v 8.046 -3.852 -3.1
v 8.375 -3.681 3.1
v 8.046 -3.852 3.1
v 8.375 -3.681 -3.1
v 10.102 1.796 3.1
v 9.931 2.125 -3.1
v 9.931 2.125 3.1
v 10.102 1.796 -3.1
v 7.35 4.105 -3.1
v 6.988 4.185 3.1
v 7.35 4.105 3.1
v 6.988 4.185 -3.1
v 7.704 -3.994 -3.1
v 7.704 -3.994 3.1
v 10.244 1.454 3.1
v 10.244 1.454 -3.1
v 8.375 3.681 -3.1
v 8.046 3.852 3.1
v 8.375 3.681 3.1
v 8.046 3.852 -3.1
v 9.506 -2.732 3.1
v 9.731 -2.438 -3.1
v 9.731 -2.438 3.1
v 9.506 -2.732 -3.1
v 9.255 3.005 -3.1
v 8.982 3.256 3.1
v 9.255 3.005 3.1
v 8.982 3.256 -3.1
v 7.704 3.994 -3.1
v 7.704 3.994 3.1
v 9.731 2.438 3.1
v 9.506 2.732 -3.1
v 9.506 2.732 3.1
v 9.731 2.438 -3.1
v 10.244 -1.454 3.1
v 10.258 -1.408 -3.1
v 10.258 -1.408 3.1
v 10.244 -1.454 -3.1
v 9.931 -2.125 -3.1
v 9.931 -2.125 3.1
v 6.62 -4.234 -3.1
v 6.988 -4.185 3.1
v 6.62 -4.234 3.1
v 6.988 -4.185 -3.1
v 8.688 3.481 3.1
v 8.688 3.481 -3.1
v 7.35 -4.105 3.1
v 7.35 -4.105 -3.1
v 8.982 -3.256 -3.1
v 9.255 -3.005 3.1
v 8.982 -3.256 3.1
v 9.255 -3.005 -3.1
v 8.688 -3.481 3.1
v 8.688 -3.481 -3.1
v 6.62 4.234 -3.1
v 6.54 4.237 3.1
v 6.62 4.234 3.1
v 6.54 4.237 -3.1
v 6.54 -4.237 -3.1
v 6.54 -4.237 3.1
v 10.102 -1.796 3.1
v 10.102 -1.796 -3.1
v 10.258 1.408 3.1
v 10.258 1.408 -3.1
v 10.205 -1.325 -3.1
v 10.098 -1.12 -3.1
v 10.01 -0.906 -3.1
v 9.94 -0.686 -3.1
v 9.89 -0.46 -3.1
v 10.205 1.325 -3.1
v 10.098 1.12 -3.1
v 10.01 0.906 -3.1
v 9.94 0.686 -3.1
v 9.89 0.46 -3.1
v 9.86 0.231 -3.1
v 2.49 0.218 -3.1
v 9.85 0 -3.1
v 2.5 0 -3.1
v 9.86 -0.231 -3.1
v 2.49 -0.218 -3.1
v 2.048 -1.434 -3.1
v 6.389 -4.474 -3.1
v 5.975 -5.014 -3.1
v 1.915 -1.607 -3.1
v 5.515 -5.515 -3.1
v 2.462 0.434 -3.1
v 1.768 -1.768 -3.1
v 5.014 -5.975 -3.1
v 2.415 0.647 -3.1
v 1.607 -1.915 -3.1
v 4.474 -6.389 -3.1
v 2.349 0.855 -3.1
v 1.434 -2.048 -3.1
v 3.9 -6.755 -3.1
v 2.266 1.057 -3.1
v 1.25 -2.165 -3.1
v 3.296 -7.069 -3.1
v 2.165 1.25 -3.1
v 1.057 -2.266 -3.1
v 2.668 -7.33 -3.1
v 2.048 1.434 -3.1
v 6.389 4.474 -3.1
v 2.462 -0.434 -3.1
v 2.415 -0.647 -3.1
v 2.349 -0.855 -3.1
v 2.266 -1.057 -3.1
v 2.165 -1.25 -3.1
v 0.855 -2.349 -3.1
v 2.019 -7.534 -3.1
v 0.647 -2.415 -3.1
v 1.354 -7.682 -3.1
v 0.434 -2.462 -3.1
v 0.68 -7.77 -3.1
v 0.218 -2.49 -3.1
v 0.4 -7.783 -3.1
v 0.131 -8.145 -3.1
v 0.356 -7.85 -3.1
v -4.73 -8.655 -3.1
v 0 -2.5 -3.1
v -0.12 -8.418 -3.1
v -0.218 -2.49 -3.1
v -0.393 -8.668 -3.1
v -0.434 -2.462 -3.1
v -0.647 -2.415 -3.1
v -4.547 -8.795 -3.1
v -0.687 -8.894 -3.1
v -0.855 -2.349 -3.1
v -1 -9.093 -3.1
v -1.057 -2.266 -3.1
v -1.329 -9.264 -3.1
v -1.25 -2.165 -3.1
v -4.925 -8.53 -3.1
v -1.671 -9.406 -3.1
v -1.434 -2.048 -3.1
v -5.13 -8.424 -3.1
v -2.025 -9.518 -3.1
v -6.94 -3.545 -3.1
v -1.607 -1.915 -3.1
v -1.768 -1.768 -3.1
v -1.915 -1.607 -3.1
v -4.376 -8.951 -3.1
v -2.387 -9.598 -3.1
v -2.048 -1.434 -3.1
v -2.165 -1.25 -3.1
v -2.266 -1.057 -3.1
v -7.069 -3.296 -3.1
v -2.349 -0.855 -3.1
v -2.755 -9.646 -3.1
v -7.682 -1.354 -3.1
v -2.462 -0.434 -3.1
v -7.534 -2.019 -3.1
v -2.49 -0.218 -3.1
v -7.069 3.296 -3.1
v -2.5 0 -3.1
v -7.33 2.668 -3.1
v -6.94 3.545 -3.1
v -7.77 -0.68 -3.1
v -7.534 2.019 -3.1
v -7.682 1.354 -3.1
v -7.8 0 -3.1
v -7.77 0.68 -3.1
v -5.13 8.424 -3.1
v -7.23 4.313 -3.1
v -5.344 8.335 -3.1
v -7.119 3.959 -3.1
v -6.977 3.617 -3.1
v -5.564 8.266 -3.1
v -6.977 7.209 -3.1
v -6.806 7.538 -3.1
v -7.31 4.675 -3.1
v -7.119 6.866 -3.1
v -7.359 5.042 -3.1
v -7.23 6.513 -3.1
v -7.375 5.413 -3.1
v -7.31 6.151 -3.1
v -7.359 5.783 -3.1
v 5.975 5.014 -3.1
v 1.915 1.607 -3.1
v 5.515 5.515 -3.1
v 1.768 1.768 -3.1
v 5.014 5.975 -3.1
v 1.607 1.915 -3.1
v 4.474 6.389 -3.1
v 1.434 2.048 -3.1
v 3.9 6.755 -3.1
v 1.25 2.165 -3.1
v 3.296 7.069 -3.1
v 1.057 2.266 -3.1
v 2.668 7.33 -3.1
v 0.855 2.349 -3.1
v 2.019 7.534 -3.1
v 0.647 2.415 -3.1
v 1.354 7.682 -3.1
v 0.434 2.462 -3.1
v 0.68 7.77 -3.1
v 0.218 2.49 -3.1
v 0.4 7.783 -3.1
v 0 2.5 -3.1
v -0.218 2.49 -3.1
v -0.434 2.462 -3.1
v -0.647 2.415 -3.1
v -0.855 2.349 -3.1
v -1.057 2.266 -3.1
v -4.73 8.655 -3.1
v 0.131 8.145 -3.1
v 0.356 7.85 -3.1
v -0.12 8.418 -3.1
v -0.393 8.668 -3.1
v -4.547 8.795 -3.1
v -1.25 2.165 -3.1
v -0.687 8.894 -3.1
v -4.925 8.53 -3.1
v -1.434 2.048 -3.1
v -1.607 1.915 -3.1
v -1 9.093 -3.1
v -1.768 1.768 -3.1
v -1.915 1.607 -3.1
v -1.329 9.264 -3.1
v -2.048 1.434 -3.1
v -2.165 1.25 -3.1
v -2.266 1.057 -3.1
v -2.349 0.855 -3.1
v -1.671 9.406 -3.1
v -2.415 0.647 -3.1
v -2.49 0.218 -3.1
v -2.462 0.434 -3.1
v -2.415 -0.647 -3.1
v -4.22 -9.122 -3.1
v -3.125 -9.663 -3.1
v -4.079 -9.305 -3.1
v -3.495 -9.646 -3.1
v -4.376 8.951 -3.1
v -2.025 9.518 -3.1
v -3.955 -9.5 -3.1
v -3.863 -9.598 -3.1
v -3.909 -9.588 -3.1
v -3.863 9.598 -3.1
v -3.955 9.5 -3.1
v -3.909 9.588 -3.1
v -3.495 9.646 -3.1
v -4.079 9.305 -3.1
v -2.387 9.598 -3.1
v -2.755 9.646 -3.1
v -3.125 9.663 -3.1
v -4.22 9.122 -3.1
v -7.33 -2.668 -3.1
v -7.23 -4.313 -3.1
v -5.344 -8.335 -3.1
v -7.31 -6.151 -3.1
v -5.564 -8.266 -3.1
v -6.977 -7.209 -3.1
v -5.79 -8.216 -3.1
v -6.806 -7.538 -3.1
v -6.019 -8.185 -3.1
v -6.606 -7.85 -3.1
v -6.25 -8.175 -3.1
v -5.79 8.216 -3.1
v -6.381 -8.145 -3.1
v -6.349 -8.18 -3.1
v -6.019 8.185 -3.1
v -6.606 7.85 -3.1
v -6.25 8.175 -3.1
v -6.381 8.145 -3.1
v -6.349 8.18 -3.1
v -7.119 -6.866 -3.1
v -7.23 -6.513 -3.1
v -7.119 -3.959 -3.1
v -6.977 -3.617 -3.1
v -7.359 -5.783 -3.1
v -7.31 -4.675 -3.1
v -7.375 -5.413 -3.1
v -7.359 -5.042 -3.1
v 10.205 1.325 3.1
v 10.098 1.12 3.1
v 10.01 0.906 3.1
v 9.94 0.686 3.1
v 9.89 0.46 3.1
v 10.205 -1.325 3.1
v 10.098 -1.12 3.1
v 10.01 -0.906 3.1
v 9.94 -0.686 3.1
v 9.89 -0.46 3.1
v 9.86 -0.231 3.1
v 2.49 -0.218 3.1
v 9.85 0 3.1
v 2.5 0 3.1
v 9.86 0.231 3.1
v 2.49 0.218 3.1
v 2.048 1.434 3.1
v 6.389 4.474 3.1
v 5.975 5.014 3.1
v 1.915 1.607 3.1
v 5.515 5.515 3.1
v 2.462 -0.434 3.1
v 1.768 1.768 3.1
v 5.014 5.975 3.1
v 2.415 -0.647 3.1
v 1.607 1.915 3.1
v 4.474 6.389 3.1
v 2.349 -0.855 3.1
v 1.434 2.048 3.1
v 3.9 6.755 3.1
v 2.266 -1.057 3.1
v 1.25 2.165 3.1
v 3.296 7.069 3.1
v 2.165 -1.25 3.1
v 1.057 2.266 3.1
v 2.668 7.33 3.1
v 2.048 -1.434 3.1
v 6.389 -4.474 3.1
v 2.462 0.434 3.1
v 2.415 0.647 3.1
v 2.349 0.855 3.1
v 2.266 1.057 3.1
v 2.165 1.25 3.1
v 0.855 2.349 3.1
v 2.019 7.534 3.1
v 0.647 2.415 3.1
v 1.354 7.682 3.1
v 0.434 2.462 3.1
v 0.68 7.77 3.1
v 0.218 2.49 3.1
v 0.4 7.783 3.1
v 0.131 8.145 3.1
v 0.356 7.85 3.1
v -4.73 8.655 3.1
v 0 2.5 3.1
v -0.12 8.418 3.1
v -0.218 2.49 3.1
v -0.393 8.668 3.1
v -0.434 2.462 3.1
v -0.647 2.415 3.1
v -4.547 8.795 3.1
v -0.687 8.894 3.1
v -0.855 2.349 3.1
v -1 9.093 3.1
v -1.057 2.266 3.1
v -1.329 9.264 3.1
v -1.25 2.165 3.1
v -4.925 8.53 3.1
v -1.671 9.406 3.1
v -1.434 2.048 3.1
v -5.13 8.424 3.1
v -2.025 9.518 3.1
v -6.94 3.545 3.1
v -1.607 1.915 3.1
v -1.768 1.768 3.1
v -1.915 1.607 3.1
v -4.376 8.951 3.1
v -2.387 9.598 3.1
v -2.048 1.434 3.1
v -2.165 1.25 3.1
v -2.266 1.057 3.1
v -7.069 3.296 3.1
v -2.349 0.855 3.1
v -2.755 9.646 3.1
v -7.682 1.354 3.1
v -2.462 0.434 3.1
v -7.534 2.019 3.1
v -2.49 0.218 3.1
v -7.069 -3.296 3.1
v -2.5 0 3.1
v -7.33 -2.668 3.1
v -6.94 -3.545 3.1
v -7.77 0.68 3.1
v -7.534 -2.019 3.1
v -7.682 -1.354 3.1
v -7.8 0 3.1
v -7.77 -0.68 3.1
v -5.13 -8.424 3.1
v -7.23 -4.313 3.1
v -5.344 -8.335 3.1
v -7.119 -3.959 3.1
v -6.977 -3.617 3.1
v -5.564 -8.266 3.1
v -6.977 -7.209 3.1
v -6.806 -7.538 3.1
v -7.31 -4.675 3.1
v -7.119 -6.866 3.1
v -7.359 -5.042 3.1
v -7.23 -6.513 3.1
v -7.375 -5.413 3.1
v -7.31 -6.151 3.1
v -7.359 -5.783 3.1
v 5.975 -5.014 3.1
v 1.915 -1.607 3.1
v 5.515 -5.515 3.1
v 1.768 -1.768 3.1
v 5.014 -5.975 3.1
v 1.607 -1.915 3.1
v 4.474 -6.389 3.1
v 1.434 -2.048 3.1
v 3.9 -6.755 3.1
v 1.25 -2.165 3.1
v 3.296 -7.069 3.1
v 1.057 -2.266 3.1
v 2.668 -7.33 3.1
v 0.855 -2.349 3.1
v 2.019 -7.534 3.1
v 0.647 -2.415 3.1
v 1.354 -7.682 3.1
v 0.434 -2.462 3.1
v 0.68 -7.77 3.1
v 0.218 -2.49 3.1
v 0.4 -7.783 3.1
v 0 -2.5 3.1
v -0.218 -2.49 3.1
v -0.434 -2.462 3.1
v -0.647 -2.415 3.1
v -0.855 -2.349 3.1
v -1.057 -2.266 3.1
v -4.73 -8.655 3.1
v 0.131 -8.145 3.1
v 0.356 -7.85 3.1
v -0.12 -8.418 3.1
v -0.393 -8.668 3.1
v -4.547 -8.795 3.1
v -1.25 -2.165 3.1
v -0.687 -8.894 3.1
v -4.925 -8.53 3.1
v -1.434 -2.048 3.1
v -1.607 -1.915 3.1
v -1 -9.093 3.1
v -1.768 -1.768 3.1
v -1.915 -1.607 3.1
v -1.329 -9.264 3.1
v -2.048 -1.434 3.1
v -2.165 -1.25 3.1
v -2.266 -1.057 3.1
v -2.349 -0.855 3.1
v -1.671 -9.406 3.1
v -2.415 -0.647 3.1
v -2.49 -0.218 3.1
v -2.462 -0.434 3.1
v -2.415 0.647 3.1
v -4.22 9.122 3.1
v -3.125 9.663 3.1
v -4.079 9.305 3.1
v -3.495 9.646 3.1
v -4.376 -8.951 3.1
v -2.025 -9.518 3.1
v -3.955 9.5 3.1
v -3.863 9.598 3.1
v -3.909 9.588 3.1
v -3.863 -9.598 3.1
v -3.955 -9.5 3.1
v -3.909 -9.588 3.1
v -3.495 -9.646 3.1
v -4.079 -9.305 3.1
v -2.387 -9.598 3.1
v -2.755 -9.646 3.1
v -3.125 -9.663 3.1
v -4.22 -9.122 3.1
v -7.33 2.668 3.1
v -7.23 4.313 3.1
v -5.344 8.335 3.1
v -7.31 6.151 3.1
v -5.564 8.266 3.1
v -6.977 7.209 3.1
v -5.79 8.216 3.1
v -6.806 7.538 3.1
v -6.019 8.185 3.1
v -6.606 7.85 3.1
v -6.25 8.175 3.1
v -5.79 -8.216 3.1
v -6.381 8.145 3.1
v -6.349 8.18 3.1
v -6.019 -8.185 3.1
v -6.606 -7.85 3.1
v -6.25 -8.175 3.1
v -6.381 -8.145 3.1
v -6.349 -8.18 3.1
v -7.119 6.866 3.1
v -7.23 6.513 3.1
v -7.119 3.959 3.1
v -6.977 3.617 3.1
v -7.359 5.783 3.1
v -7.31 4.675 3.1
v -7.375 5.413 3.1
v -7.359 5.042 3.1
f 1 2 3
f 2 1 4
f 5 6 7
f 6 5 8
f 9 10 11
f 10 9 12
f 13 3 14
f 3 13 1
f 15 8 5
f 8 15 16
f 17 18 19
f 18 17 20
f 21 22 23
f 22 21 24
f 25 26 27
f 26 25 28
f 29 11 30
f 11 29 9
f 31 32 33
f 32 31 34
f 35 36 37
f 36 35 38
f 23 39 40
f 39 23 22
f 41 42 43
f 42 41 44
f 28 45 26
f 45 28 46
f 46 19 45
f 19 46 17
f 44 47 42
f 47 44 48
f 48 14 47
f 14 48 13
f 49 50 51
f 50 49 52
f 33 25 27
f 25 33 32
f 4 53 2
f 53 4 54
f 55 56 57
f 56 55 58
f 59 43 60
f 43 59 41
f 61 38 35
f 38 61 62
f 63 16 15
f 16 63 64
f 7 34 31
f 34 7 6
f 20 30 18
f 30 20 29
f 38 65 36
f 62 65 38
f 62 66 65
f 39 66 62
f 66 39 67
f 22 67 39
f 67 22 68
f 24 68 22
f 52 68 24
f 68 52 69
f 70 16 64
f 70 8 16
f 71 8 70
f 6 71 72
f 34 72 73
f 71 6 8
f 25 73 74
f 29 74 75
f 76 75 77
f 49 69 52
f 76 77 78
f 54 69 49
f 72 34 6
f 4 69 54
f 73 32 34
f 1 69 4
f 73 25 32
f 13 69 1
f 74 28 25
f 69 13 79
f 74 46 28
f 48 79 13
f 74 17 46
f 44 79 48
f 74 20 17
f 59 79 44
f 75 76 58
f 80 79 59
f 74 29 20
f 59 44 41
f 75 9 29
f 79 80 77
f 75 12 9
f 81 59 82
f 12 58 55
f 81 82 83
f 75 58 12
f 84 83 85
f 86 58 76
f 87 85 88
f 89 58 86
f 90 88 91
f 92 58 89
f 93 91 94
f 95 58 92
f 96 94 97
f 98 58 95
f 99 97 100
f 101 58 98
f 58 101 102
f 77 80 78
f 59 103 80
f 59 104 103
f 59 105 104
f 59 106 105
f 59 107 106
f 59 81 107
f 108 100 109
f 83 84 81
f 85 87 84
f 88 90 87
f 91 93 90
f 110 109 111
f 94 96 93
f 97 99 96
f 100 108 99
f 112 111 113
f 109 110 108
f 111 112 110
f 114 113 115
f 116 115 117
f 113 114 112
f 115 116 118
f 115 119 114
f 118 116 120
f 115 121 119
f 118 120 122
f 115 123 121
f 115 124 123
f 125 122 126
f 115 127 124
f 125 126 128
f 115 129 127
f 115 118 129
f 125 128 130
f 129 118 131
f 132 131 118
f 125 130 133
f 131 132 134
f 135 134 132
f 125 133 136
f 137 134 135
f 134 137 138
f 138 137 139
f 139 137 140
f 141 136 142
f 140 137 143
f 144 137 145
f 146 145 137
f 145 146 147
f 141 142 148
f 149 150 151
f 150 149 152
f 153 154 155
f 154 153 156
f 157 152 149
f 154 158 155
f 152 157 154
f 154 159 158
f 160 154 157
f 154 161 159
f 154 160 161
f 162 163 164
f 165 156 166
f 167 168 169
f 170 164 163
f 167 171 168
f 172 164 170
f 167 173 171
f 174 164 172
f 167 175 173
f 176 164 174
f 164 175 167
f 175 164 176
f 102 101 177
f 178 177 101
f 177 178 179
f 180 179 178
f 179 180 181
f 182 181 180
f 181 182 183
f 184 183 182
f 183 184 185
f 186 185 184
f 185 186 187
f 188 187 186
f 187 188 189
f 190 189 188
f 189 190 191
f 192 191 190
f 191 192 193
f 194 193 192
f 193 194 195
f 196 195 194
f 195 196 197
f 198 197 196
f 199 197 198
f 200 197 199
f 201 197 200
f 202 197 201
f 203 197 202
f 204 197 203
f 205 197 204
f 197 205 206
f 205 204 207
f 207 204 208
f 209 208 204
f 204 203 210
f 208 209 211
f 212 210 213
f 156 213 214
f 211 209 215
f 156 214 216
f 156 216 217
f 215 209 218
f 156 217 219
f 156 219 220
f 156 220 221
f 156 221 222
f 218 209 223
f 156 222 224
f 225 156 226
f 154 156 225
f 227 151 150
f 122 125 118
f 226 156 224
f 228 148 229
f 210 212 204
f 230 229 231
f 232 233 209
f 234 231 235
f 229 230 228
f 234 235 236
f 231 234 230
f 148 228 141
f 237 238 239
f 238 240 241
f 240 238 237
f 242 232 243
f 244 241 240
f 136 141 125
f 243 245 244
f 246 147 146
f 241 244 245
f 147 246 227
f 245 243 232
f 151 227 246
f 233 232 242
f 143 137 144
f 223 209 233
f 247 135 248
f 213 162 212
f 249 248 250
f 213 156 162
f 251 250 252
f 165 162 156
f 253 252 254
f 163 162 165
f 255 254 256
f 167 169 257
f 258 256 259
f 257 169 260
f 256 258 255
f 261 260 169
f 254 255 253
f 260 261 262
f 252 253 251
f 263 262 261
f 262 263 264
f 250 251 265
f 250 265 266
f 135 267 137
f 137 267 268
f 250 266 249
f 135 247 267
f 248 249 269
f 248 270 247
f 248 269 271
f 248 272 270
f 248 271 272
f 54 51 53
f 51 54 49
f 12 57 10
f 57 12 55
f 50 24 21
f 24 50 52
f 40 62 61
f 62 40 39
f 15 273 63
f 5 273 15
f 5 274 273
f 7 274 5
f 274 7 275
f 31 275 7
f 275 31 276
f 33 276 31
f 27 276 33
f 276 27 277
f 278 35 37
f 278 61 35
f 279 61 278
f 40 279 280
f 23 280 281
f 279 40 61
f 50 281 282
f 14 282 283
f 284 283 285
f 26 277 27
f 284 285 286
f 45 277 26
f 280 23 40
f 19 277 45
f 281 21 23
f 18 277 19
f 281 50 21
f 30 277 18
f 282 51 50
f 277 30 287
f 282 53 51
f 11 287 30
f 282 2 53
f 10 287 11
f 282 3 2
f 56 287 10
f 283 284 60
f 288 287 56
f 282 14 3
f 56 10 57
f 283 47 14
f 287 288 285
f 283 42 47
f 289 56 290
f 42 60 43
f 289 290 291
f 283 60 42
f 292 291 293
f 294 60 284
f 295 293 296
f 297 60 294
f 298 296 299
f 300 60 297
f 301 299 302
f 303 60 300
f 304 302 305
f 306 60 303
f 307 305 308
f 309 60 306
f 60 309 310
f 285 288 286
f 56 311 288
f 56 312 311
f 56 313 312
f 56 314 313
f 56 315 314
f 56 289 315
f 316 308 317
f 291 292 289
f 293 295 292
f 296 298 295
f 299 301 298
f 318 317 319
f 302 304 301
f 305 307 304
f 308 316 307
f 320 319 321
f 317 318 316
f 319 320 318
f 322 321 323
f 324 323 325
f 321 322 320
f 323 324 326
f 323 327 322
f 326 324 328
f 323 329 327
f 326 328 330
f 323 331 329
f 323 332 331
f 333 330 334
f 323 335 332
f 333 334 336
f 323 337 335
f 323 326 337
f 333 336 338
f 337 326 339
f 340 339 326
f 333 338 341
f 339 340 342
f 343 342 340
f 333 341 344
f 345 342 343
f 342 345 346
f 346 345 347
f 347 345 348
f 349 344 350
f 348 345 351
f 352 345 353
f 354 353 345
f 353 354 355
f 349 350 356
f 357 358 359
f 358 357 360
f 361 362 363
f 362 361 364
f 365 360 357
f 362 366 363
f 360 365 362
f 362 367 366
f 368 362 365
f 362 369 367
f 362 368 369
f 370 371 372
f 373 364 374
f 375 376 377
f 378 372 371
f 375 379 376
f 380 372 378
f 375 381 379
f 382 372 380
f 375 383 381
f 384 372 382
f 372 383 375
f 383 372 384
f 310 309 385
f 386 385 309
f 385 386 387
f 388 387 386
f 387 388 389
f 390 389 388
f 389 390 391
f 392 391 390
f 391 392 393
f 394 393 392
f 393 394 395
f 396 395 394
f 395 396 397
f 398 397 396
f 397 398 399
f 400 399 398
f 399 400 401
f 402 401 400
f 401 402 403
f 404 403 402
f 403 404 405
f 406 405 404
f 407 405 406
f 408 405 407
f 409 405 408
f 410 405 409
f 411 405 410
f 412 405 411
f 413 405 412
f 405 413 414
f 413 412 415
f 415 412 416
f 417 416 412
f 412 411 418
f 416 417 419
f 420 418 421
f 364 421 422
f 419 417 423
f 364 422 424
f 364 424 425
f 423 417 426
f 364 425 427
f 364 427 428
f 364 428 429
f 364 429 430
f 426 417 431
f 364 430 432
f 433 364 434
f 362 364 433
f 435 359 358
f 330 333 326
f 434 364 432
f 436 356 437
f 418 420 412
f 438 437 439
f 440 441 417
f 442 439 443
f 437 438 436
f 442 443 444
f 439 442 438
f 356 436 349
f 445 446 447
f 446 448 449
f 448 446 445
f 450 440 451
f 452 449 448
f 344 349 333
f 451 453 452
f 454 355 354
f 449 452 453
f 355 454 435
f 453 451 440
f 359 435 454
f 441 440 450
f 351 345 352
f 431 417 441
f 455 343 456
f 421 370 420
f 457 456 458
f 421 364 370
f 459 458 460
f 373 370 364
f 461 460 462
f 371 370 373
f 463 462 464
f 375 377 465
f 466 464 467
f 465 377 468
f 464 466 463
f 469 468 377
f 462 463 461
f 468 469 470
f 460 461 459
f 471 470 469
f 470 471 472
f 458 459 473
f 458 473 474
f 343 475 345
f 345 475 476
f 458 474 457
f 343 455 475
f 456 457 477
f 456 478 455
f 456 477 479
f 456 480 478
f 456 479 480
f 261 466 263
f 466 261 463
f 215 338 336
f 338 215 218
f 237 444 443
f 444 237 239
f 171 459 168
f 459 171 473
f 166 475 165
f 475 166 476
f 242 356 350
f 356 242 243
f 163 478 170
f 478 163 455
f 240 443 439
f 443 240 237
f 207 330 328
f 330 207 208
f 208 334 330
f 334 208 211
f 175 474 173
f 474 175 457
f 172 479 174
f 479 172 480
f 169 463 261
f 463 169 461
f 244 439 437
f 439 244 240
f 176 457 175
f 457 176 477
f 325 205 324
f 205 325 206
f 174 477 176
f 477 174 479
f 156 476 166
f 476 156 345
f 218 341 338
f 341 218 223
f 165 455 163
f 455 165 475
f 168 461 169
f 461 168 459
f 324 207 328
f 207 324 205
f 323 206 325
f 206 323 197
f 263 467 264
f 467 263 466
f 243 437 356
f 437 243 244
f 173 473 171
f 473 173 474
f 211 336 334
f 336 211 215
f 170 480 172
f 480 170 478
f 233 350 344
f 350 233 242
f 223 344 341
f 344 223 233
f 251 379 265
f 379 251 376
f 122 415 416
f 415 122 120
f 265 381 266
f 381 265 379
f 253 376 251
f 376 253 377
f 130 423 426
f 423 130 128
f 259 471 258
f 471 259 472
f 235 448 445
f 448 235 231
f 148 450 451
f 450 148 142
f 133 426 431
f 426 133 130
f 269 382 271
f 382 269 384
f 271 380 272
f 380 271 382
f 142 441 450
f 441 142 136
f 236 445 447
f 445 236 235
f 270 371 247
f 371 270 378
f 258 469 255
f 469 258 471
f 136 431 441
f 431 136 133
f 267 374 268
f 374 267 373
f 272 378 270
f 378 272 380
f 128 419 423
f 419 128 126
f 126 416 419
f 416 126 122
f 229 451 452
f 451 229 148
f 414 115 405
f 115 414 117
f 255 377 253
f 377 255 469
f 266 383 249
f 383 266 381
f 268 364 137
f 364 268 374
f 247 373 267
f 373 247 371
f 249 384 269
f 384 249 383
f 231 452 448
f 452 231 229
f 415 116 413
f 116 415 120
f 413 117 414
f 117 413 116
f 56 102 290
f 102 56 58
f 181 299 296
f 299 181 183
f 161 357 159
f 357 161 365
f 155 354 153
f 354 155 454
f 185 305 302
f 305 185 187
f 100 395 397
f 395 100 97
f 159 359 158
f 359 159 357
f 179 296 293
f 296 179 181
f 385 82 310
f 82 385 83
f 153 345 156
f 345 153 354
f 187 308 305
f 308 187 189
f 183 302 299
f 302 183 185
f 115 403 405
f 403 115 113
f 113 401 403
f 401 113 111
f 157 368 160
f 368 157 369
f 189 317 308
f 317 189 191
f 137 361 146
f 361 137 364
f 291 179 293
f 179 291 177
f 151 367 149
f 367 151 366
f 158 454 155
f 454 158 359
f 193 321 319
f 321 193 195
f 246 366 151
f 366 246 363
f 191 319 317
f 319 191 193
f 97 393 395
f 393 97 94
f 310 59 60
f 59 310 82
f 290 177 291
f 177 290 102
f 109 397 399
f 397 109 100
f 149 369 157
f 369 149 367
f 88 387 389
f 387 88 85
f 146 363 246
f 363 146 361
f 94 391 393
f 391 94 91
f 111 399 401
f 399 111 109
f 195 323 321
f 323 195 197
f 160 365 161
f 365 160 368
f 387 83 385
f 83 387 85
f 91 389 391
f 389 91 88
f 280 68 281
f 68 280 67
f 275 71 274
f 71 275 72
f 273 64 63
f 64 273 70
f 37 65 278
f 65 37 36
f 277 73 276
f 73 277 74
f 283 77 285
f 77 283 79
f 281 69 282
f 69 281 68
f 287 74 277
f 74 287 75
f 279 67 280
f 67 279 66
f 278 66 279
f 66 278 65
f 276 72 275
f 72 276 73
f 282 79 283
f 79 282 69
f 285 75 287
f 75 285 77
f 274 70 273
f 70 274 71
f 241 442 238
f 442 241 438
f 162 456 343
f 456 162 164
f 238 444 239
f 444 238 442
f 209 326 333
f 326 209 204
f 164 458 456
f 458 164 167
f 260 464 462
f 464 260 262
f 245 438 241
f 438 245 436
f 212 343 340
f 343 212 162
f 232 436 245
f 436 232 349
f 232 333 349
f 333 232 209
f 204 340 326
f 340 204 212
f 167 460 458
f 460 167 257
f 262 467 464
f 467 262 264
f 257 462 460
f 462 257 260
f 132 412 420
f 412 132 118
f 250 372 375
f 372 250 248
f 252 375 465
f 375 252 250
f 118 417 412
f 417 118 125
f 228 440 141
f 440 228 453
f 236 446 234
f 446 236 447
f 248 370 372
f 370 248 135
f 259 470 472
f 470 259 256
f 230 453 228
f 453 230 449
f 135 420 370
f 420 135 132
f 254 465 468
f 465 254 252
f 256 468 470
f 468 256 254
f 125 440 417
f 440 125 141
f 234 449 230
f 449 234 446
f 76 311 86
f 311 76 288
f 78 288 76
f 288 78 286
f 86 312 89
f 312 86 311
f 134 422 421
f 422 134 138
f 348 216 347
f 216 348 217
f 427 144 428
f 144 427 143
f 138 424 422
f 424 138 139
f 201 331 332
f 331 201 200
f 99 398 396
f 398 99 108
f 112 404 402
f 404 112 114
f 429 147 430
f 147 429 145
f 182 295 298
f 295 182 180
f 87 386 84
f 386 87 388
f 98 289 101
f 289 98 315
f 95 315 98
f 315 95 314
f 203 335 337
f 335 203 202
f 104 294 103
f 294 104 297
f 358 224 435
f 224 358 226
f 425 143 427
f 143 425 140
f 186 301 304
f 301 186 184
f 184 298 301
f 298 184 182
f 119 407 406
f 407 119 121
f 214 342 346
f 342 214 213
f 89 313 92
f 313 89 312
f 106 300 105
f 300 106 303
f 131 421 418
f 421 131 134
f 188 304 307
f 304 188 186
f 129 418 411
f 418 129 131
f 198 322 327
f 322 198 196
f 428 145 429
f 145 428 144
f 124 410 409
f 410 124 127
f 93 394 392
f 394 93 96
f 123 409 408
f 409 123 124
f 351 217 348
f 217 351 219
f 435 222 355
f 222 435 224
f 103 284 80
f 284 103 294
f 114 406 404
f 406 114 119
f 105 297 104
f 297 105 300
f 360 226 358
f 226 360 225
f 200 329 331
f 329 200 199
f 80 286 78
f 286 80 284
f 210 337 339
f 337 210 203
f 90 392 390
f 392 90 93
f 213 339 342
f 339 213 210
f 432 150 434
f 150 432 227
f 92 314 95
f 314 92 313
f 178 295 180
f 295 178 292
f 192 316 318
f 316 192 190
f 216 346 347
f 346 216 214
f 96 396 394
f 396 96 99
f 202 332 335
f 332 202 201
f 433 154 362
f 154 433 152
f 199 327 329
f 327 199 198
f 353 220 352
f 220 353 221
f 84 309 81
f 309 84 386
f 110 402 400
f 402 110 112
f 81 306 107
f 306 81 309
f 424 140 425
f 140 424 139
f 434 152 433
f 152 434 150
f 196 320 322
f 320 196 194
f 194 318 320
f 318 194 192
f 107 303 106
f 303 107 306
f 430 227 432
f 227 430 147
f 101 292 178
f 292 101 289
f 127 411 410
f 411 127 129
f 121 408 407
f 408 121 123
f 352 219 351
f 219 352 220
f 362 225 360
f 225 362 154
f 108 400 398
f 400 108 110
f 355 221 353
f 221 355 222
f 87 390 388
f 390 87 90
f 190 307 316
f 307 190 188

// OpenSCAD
$fn = 72;  // smooth curves

thickness = 6.2;
hub_r = 7.8;
arm_r = 4.25;
port_dist = 12.5;
hole_r = 2.65;  // 5.3 mm hole

module connector_3way() {
  difference() {
    union() {
      cylinder(h=thickness, r=hub_r, center=true);  // central hub
      
      // three arms at 120°
      for (a = [0, 120, 240]) {
        rotate([0,0,a])
          translate([port_dist/2, 0, 0])
            cylinder(h=thickness, r=arm_r, center=true);
      }
    }
    
    // rod holes
    for (a = [0, 120, 240]) {
      rotate([0,0,a])
        translate([port_dist, 0, 0])
          cylinder(h=thickness+2, r=hole_r, center=true);
    }
    
    // light central relief
    cylinder(h=thickness+2, r=2.5, center=true);
  }
}

connector_3way();
